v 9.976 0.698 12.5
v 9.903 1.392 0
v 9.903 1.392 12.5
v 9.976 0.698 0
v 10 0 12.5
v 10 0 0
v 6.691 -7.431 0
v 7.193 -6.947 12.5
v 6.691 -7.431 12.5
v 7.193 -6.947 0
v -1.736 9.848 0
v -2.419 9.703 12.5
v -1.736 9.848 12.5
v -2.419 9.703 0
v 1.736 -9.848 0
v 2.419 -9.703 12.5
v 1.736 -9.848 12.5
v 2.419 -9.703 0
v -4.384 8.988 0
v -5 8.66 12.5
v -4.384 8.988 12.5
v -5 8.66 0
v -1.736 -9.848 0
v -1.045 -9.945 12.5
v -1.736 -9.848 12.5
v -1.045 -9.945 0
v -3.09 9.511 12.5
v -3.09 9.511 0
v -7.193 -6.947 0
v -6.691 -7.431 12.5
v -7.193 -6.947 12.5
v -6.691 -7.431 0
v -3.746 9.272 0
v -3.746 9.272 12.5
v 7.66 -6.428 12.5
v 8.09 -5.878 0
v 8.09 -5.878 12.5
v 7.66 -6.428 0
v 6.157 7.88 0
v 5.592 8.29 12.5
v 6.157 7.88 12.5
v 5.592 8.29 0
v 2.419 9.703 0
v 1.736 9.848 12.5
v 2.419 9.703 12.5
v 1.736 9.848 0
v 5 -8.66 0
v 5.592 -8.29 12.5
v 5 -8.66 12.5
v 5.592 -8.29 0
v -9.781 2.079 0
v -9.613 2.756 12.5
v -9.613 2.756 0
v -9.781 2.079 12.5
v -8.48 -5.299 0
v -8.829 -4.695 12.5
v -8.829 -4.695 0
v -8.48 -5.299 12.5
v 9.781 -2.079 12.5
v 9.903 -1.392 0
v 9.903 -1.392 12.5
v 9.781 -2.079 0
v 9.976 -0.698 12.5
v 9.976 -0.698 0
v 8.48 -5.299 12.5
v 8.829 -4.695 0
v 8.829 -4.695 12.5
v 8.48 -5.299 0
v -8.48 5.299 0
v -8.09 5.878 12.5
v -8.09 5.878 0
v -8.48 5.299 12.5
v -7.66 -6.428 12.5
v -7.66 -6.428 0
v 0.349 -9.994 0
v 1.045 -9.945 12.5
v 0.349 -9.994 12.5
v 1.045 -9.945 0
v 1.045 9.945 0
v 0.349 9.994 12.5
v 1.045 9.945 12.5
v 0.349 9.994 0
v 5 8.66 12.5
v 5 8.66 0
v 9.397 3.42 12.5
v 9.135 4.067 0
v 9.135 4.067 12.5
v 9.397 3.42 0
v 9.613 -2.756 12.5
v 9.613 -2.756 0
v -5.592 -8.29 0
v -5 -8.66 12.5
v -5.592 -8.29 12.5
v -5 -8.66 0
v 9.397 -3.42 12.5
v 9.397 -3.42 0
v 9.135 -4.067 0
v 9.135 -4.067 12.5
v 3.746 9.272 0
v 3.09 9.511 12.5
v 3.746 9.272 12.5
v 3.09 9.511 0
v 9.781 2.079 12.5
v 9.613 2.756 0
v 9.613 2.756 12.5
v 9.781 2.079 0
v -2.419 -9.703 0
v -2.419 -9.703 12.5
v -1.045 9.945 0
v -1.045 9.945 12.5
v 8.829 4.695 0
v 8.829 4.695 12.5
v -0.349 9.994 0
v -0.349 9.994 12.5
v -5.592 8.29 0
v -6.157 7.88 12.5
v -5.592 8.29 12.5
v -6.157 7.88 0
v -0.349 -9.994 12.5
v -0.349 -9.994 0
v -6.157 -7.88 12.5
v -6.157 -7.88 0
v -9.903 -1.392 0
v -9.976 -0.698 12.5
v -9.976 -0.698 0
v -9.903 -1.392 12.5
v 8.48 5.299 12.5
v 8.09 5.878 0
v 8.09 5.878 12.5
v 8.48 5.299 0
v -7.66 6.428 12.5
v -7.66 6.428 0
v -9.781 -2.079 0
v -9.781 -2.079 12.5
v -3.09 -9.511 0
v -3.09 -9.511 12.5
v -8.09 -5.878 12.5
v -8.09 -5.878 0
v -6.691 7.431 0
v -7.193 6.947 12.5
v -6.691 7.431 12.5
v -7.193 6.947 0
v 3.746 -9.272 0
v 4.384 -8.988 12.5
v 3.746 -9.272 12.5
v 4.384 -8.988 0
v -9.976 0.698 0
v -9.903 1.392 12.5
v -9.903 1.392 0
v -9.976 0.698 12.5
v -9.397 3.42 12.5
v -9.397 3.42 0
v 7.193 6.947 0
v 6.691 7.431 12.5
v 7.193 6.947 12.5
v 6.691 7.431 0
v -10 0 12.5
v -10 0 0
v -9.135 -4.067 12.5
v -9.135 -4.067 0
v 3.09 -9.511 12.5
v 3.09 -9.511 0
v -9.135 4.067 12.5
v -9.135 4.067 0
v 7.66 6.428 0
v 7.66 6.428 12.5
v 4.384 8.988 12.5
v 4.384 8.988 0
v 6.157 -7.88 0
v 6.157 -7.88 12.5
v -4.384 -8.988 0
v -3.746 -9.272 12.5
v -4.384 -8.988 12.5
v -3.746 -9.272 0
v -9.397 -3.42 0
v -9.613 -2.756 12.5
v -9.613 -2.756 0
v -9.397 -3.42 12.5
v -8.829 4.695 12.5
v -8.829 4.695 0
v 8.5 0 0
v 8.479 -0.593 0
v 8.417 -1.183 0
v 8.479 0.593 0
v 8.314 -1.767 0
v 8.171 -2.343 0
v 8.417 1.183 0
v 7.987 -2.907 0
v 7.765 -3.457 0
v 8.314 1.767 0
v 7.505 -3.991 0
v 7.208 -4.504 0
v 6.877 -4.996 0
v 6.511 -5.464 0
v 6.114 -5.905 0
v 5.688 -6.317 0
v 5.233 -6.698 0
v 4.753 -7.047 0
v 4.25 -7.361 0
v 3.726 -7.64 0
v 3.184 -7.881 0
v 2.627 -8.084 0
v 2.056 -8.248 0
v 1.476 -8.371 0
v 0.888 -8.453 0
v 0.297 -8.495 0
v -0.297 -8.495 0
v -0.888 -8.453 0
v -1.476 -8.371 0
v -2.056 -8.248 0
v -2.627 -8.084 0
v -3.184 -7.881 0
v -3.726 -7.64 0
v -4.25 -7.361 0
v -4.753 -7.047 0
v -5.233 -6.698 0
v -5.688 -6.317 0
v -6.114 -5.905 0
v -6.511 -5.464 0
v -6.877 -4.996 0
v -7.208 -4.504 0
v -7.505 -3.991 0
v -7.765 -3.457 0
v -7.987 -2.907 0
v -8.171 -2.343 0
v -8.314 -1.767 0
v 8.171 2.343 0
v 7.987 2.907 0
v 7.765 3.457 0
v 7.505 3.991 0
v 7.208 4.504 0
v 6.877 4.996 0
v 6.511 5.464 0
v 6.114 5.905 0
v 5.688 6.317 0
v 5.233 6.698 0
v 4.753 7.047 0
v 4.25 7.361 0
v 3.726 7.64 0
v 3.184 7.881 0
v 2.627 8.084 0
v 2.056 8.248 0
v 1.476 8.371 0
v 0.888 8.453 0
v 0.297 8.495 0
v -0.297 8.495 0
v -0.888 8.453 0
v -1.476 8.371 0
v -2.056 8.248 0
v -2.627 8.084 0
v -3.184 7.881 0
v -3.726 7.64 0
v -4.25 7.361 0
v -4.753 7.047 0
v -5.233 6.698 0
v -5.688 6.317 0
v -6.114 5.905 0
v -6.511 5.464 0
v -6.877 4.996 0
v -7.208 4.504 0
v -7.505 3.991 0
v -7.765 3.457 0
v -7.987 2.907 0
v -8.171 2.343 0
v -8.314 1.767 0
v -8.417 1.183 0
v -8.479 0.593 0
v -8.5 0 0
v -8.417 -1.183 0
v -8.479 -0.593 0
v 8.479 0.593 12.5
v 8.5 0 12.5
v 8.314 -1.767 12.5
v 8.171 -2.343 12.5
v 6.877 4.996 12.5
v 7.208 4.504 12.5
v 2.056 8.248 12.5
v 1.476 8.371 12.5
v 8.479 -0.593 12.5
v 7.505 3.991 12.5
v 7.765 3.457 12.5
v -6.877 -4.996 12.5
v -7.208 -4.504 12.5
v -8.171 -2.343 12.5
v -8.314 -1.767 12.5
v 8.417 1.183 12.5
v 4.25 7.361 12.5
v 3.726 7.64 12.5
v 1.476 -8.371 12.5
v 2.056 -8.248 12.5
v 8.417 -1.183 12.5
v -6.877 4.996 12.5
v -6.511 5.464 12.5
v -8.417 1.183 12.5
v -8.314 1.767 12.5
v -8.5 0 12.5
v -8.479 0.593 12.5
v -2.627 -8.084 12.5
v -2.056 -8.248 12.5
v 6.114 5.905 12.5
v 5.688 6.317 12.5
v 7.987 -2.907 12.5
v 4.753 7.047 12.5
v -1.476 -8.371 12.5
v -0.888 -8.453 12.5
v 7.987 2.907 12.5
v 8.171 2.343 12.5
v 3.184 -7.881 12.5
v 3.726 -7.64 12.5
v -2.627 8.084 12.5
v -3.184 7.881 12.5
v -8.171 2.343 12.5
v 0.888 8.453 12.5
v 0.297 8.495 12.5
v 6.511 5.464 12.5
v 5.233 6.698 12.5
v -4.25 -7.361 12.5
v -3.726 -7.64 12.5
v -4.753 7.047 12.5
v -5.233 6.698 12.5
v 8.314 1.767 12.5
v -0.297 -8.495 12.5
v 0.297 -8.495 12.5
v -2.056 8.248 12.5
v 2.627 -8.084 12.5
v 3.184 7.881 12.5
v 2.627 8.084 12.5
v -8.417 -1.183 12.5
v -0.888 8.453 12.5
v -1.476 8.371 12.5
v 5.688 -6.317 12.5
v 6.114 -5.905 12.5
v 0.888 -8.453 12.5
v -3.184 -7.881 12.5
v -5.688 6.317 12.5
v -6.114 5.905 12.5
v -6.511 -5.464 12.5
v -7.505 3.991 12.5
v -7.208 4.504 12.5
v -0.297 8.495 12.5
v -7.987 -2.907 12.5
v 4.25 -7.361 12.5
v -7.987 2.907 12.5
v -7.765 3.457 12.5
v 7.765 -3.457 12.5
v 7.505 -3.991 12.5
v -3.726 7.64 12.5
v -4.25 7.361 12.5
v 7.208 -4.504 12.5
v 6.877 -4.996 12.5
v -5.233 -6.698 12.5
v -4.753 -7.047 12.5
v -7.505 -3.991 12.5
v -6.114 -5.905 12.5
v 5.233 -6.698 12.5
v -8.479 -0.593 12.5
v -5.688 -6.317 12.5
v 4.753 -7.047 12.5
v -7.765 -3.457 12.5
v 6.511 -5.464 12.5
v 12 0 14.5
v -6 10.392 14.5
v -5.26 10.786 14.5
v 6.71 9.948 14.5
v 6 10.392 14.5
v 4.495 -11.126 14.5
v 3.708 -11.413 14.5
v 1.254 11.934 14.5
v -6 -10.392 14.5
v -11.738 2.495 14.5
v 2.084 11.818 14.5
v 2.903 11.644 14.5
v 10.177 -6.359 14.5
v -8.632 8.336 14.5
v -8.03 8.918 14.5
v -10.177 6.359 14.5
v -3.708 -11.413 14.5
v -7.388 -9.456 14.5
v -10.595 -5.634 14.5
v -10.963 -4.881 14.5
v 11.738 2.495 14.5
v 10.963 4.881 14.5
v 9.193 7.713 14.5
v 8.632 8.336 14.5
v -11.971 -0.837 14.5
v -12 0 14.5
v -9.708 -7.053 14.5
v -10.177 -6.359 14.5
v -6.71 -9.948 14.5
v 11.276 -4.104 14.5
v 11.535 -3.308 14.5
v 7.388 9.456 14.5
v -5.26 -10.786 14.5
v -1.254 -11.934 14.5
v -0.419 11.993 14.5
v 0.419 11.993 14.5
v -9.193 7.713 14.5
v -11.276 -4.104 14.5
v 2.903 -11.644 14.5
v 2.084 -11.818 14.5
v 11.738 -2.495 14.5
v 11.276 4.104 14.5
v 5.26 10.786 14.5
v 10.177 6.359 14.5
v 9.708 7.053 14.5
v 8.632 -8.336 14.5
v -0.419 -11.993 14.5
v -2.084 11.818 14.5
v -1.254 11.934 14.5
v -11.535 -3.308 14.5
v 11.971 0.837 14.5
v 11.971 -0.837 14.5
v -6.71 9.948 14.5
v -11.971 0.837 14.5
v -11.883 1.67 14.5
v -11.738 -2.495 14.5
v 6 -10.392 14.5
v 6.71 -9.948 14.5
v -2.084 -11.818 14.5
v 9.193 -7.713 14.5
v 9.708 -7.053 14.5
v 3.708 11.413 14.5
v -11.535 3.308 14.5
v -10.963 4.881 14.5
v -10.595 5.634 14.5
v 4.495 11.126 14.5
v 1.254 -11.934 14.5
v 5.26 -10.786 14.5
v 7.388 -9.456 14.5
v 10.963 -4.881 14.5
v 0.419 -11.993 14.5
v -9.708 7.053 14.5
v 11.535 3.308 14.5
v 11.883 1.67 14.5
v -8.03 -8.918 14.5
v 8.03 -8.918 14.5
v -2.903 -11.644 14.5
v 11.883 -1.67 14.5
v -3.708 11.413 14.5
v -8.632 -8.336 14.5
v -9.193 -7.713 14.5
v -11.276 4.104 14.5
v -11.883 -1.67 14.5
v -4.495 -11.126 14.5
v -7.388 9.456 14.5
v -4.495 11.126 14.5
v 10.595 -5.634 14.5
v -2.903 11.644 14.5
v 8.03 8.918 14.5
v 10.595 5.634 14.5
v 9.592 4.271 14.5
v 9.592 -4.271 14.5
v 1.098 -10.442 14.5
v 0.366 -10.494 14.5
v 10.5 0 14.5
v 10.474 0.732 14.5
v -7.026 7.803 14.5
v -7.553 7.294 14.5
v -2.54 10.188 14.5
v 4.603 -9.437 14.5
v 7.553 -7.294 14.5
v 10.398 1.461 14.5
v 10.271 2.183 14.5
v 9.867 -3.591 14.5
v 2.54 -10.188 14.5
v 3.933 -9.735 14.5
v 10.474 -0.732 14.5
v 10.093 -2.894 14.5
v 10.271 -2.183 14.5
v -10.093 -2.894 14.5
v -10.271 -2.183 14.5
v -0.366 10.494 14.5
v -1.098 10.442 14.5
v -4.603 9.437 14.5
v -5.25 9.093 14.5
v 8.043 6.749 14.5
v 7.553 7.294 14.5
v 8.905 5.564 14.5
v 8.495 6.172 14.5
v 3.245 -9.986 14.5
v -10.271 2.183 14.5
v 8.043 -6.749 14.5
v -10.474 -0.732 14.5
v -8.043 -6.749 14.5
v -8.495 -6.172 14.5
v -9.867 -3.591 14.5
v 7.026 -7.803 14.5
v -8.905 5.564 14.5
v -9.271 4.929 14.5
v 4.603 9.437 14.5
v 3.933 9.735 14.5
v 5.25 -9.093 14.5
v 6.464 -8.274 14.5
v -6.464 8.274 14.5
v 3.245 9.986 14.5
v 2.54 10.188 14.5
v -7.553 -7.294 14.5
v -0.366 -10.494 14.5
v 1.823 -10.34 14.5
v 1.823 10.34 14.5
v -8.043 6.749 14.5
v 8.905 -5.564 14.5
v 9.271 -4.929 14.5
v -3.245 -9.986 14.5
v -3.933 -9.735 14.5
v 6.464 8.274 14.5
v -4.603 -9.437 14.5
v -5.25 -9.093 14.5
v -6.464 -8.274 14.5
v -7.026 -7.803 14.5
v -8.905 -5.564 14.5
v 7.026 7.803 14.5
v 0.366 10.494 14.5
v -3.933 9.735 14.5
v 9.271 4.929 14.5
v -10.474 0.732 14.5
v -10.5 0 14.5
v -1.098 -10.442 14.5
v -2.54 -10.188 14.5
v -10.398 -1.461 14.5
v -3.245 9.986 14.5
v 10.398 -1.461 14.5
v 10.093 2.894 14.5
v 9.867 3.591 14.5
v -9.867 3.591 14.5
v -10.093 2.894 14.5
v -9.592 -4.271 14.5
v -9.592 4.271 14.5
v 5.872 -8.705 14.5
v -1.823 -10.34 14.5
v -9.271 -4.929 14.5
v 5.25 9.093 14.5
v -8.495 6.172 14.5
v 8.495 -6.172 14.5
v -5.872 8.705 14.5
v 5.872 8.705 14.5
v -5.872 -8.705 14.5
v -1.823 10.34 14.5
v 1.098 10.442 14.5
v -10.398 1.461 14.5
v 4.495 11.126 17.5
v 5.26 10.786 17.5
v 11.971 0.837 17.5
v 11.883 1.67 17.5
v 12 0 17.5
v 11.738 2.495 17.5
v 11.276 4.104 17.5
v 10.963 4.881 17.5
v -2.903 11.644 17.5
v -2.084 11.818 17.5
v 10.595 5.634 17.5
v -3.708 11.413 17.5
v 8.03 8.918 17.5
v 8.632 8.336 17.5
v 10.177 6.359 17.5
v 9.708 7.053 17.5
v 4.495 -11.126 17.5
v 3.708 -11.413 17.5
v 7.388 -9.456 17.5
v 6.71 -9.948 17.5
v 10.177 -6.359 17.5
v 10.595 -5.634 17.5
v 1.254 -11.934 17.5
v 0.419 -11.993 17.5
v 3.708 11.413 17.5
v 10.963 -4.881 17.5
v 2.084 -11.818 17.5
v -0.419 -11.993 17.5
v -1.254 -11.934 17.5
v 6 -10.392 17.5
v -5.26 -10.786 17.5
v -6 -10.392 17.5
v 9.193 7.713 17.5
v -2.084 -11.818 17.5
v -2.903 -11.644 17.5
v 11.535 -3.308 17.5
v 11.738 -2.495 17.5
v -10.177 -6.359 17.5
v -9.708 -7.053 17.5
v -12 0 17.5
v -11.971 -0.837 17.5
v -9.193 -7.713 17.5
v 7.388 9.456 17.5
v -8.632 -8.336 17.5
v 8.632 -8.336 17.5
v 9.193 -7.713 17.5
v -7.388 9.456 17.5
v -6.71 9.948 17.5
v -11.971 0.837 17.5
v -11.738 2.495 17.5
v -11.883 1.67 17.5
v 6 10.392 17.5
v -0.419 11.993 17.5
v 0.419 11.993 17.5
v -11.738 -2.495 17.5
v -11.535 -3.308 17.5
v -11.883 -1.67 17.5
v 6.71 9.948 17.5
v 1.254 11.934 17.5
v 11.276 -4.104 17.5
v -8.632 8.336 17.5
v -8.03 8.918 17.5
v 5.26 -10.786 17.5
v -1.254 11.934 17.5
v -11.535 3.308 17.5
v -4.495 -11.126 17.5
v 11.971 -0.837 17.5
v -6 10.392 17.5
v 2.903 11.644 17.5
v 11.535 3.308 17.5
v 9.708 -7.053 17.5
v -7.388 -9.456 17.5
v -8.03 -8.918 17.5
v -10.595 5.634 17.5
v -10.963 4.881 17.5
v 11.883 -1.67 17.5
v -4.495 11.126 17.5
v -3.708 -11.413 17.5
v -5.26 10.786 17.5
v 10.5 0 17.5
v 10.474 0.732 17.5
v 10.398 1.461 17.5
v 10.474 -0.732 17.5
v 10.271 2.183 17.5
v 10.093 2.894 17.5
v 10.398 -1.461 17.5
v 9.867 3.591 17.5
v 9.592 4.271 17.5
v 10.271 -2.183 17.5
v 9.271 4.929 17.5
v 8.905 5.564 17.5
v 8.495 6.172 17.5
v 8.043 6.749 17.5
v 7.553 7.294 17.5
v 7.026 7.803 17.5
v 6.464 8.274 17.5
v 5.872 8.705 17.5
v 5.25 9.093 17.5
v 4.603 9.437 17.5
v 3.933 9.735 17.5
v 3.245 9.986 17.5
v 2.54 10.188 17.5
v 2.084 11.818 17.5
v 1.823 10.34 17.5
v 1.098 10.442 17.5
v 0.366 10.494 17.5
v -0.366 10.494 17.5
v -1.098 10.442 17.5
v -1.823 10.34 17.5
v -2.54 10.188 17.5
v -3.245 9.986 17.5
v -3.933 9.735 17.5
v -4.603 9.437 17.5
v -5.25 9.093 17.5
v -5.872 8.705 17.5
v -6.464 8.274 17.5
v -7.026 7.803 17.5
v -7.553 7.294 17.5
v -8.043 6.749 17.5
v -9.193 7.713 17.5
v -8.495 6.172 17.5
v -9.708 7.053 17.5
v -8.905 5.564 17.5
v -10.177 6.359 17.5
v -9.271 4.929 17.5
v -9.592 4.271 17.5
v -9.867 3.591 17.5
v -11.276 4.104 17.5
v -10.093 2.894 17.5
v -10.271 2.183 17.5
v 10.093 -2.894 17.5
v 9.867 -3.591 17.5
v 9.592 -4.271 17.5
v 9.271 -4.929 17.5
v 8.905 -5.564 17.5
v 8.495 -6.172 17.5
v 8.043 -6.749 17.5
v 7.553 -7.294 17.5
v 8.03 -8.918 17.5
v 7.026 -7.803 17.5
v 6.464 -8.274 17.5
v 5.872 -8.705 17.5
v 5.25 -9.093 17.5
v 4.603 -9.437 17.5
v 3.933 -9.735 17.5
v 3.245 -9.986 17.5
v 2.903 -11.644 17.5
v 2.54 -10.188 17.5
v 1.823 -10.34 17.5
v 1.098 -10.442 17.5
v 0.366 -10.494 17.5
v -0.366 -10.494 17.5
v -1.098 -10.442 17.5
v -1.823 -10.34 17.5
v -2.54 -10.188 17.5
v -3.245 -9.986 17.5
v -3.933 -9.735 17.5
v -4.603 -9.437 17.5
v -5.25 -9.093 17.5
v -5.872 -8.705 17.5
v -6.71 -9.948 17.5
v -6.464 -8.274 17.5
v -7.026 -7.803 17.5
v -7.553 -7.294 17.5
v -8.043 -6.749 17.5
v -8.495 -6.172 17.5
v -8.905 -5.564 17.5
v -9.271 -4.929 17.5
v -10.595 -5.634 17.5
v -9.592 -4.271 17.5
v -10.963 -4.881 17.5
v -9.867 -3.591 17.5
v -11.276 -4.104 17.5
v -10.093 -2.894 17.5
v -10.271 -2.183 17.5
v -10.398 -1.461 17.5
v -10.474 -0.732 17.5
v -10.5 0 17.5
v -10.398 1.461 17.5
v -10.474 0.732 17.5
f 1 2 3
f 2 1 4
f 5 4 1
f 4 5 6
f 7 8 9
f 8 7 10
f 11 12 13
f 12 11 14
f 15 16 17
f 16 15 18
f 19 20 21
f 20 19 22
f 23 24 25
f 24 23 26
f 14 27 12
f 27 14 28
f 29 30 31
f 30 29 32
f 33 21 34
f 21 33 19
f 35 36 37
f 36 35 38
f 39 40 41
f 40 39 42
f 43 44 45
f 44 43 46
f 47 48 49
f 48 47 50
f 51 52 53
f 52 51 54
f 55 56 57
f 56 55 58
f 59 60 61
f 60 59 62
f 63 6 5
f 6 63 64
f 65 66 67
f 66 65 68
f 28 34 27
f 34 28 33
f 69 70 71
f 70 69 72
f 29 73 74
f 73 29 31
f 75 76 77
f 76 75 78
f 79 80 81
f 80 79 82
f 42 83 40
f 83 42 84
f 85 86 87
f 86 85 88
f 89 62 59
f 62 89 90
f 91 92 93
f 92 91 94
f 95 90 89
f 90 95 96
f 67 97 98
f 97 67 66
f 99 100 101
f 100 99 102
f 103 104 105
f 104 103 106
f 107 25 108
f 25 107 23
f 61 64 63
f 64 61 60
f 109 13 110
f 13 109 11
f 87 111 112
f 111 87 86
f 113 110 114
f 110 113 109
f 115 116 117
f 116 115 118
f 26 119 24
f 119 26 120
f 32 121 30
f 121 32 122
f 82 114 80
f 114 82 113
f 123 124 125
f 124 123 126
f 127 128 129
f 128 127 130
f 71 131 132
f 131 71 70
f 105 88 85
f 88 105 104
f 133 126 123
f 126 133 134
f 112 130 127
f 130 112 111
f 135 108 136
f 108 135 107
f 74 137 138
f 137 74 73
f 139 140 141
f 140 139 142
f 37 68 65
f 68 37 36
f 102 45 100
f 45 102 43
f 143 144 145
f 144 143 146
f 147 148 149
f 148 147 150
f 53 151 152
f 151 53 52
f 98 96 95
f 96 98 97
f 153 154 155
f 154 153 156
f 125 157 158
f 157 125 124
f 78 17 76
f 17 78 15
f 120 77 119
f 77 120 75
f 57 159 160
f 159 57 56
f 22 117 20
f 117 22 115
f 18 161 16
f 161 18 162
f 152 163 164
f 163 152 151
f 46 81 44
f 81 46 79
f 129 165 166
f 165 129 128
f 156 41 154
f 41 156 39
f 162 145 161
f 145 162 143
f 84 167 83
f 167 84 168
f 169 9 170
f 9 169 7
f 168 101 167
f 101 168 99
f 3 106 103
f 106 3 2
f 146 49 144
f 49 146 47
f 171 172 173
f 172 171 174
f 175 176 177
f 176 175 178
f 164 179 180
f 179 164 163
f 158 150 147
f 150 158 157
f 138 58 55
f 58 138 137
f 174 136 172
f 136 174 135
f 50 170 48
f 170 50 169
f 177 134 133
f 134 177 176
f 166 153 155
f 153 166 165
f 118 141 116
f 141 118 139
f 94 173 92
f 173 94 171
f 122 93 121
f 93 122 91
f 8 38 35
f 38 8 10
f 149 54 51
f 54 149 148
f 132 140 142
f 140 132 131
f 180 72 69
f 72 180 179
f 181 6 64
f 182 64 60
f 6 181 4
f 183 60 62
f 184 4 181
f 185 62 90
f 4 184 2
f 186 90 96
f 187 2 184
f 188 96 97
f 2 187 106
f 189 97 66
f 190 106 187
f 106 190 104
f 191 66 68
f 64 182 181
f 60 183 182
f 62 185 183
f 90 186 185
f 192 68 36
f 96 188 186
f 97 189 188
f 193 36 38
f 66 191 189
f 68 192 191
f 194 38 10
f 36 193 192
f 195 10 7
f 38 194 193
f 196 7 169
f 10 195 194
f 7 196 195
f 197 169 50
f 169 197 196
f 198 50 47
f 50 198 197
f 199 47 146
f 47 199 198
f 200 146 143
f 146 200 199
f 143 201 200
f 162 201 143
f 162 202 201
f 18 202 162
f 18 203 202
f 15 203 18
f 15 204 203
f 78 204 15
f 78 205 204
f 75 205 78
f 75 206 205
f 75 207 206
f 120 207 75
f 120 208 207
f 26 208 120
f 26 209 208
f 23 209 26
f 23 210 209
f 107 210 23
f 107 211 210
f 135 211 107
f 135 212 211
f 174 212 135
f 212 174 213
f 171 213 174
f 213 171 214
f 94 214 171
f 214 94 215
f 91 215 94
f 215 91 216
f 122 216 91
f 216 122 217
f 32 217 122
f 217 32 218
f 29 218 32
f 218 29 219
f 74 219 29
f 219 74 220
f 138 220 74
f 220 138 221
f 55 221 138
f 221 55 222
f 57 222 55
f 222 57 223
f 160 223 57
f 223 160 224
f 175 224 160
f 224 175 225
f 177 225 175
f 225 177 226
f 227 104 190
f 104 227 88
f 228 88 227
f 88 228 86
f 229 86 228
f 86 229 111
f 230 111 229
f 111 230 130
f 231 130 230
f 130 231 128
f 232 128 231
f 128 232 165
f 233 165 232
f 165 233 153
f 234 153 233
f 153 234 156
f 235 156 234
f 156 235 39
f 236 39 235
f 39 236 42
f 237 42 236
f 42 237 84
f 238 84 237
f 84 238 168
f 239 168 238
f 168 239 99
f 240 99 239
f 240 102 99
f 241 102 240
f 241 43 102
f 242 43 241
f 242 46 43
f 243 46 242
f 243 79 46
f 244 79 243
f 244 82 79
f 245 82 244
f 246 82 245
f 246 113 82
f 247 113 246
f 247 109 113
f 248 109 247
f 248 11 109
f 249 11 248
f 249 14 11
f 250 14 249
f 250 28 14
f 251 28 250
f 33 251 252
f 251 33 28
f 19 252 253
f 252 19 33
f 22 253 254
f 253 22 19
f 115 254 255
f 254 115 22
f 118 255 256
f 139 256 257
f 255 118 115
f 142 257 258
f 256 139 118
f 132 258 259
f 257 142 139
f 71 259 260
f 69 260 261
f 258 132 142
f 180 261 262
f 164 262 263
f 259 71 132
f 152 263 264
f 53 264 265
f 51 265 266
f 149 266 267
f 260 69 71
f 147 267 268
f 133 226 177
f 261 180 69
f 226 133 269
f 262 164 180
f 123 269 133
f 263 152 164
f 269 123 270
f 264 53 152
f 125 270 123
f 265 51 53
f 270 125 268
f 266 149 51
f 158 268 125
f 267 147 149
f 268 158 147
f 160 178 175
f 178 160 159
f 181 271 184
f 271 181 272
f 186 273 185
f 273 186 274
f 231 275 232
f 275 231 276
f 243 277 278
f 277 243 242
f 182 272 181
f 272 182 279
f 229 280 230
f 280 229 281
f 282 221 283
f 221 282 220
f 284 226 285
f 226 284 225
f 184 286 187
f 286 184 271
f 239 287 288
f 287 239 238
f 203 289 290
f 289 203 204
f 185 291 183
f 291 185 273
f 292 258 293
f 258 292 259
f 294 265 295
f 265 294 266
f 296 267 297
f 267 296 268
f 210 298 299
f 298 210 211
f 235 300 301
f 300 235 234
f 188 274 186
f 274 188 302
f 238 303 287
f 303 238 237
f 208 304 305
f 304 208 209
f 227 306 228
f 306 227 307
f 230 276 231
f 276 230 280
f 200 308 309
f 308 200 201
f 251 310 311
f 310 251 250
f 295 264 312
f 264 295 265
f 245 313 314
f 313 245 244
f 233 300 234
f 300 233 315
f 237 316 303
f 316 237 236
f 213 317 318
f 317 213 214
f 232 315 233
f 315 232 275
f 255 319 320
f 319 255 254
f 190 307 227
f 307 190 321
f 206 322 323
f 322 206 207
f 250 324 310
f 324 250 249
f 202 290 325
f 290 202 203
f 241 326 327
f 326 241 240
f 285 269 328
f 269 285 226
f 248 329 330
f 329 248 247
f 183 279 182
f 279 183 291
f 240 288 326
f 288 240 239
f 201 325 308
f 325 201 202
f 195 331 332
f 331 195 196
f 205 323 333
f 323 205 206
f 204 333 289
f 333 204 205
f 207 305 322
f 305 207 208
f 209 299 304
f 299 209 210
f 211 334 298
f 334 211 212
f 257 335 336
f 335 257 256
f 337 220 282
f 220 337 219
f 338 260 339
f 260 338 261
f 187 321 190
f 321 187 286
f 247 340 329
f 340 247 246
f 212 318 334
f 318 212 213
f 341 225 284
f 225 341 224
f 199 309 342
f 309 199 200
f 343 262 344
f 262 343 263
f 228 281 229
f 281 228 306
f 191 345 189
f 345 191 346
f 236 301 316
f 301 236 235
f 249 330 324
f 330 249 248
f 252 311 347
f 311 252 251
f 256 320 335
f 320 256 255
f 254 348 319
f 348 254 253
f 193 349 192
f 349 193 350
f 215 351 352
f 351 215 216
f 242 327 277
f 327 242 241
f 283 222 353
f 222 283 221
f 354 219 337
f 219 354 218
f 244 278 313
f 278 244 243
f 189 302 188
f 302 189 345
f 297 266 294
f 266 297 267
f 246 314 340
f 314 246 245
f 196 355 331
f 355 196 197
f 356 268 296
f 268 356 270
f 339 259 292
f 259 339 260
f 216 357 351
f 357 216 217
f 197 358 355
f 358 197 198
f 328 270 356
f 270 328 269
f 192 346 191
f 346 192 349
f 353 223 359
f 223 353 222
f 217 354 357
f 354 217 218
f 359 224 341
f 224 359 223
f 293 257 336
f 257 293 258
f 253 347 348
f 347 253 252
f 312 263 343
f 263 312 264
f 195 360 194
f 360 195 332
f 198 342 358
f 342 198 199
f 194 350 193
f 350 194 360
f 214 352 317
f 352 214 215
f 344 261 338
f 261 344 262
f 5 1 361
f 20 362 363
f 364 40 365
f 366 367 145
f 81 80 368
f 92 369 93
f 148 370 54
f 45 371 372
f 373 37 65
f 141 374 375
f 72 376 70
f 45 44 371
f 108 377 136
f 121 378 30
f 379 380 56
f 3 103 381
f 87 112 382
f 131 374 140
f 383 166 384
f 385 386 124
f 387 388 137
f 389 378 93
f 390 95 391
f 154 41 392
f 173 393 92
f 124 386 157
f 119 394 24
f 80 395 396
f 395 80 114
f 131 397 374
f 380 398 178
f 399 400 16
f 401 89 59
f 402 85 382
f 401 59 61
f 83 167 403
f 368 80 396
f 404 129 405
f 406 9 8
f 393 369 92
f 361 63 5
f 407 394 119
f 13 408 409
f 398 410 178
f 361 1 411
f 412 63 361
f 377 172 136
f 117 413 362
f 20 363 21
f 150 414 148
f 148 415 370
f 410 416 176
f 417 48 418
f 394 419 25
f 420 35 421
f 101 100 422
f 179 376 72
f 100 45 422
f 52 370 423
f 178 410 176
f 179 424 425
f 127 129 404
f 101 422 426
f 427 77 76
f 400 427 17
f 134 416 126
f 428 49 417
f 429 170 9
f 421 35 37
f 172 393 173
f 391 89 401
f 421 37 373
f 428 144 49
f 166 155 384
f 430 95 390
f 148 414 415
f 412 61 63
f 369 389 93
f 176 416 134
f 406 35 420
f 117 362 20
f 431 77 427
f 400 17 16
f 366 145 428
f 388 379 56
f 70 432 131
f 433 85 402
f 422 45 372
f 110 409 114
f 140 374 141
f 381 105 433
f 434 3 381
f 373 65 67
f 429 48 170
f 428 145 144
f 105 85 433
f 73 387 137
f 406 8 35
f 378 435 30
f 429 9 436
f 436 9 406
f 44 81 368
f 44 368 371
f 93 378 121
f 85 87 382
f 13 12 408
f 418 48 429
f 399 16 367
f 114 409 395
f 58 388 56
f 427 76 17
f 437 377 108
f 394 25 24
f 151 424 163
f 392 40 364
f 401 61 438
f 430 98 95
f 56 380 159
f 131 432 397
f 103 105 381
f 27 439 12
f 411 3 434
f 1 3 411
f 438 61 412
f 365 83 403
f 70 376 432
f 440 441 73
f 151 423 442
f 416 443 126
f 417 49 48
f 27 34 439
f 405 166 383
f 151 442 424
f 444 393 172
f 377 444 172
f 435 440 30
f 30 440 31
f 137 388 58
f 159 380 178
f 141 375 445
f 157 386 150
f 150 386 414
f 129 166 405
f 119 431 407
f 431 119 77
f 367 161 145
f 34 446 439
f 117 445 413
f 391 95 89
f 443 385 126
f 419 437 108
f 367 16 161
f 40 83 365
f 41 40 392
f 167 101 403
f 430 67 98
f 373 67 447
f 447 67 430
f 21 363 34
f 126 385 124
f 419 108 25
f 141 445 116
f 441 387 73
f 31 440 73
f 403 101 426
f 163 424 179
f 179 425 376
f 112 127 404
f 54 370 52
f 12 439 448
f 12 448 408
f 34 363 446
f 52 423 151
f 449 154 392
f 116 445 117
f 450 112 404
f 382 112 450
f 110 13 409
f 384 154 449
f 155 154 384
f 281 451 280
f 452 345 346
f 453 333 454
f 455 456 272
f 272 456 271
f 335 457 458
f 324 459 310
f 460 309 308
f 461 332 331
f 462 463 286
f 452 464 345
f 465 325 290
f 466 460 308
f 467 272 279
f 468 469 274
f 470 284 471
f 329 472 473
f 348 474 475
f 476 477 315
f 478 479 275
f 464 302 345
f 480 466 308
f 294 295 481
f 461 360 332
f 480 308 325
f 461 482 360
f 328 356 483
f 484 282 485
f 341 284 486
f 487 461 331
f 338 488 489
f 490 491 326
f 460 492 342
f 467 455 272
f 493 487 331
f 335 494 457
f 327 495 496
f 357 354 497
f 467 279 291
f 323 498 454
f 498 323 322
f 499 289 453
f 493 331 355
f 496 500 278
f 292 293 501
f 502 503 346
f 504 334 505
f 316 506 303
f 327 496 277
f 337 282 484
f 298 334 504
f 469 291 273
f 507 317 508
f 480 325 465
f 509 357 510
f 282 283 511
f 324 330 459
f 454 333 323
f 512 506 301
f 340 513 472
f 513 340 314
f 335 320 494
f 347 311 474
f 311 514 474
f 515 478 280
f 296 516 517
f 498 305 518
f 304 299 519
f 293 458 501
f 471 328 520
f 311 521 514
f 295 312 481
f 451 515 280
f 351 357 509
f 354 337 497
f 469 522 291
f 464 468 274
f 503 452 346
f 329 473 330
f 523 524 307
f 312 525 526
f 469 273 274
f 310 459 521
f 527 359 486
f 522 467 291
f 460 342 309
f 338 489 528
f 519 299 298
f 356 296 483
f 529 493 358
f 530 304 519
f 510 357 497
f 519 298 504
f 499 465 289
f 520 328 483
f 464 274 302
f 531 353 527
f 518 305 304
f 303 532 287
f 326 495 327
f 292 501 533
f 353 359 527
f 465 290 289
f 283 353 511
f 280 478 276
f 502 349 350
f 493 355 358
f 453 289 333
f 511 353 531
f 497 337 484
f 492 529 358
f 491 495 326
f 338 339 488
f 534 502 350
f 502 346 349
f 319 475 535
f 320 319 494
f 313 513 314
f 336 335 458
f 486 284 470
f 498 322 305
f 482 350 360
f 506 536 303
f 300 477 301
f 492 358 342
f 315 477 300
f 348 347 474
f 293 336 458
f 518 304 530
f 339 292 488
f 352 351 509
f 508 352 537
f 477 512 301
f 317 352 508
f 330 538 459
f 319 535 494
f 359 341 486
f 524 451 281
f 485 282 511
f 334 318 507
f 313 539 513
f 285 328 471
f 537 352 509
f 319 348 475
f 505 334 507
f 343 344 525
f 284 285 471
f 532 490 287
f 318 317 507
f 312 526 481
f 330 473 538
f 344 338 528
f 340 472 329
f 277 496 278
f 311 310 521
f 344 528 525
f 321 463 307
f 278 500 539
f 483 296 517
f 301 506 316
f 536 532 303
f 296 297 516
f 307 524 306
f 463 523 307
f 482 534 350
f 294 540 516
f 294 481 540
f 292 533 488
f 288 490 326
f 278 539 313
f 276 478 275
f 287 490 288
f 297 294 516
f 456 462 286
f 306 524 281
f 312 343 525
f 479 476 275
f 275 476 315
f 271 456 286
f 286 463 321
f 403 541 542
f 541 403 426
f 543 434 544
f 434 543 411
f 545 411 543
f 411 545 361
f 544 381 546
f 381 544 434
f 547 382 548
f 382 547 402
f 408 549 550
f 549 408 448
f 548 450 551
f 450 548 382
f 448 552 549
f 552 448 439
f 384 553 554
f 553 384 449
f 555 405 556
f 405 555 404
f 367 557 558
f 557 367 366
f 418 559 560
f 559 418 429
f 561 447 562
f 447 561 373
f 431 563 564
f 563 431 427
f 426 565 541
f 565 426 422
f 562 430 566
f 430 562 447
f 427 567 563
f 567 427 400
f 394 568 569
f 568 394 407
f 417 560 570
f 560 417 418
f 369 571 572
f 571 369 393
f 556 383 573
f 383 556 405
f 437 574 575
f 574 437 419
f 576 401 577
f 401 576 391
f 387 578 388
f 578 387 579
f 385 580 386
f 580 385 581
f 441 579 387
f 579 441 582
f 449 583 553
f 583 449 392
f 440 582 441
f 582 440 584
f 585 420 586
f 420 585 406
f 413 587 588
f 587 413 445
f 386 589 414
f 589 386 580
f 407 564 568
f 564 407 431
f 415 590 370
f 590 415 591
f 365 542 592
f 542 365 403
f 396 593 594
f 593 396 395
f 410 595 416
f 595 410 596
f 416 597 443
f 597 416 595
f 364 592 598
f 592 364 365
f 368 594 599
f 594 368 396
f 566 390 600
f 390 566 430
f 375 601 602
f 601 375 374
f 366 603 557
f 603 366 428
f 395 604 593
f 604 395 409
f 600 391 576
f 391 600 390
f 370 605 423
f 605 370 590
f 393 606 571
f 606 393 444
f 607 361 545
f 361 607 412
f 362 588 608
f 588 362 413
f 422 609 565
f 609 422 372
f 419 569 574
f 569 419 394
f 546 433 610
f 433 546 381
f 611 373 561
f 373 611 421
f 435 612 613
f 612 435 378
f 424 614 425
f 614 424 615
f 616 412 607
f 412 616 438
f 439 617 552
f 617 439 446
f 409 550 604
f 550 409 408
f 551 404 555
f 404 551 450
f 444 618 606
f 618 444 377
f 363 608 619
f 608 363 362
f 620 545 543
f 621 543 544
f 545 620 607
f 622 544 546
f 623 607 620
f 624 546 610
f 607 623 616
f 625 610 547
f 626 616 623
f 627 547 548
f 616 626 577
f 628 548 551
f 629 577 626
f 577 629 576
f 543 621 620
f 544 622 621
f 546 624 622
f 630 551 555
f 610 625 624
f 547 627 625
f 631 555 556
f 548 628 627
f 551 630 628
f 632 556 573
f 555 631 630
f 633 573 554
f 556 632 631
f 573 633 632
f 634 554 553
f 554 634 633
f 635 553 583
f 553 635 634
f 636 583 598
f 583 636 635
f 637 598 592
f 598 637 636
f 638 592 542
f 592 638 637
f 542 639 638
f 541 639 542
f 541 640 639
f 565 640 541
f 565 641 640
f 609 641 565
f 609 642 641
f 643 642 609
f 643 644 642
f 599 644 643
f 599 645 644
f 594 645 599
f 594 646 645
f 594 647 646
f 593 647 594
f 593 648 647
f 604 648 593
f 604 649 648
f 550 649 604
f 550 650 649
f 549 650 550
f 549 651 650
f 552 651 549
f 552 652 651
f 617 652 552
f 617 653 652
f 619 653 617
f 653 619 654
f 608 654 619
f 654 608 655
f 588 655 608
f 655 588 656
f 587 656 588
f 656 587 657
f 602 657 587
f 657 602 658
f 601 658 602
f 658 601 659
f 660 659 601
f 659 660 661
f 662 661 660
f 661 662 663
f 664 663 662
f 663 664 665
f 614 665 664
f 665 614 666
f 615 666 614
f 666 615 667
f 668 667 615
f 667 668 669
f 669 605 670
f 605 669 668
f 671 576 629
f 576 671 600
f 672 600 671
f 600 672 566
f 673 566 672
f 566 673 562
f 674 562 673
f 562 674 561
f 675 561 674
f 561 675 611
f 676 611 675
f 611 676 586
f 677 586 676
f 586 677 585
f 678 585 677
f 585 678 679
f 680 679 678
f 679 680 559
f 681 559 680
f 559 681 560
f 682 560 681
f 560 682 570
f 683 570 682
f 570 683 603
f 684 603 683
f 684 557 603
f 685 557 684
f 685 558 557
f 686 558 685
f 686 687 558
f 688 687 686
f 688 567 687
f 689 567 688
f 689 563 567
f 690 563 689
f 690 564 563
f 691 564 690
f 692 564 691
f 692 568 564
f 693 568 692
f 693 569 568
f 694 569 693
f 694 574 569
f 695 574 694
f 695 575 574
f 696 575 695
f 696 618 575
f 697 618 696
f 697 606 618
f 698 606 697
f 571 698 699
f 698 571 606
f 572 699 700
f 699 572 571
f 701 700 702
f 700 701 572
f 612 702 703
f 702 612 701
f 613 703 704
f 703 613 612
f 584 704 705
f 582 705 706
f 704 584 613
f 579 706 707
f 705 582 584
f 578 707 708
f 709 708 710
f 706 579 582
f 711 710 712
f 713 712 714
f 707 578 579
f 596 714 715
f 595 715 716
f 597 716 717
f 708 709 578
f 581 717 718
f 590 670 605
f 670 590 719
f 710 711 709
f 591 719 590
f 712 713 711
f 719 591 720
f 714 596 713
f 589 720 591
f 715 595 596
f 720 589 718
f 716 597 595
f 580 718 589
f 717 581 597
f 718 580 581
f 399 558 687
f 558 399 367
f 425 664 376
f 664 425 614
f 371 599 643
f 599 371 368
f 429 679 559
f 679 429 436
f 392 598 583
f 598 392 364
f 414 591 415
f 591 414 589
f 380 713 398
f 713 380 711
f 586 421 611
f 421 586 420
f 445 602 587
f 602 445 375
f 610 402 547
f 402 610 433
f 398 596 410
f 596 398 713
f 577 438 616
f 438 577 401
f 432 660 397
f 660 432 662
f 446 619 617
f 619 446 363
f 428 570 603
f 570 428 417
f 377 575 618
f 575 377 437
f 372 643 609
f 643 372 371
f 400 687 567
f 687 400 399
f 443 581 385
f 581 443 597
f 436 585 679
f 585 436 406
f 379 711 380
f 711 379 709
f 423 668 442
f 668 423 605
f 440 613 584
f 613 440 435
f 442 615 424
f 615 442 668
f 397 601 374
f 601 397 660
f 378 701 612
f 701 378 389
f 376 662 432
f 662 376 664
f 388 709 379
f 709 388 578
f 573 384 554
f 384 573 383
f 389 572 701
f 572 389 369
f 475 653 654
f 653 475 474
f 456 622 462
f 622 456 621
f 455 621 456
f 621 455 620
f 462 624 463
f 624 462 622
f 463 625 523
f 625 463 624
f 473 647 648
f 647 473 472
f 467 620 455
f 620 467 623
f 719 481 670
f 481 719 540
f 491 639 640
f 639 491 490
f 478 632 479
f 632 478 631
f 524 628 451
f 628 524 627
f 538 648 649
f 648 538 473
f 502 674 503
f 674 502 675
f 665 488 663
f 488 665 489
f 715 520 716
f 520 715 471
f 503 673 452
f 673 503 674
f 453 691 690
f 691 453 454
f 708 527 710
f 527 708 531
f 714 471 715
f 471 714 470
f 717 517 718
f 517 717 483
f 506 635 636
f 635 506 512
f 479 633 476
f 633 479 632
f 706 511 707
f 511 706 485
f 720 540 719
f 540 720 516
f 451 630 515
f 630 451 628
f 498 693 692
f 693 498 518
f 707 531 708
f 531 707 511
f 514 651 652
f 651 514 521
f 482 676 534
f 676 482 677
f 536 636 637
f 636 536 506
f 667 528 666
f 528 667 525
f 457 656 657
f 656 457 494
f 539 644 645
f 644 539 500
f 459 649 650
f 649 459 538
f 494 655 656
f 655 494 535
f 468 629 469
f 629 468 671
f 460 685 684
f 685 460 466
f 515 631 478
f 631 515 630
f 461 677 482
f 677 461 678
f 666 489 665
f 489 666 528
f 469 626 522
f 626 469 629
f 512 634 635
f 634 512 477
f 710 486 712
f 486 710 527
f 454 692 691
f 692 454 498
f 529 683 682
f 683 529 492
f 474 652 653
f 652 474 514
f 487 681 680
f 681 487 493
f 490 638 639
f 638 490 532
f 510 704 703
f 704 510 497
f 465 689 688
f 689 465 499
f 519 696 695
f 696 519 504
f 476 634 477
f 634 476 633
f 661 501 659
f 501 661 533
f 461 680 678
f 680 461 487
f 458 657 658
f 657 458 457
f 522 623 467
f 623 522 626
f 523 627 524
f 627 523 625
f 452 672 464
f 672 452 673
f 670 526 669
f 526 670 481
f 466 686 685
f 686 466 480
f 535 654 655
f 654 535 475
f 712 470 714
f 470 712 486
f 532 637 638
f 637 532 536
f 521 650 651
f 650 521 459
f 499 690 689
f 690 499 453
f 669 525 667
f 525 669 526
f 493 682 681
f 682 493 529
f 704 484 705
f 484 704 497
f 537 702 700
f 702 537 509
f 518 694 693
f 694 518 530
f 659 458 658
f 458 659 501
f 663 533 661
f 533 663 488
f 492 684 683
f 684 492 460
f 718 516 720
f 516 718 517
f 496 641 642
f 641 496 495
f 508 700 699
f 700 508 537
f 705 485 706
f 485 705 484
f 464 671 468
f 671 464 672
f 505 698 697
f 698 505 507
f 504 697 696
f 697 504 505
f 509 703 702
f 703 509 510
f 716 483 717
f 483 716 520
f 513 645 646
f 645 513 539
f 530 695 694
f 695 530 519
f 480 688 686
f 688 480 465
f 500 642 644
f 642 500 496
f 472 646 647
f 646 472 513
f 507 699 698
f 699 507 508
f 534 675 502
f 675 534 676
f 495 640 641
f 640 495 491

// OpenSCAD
//Parameterised coupling generator
// Glyn Cowles Mar/Apr 2013


//Thickness of tube walls 
thickness=1.5; 
//Outside diameter of bottom tube 
d1=20;   
//Height of bottom tube 
h1=12.5;   // 12.5 for raptor
//Outside diameter of top tube
d2=24;   
//Height of top tube
h2=3;   
//Height of connector section
c_ht=2; 

// resolution
$fn=90;
assemble(); 
//-----------------------------------------------------------------------
module tube(d,h) {
rad=d/2;
difference() {
cylinder(h=h,r=rad);
cylinder(h=h,r=rad-thickness);
}
}
//-----------------------------------------------------------------------

module connector(){
difference() {
 cylinder (h=c_ht,r1=d1/2,r2=d2/2);
 cylinder (h=c_ht,r1=d1/2-thickness,r2=d2/2-thickness);
}
}

module assemble() {
union() {
	tube(d1,h1);
	translate([0,0,h1]) connector(); 
	translate([0,0,h1+c_ht])  tube(d2,h2);
	}
};
